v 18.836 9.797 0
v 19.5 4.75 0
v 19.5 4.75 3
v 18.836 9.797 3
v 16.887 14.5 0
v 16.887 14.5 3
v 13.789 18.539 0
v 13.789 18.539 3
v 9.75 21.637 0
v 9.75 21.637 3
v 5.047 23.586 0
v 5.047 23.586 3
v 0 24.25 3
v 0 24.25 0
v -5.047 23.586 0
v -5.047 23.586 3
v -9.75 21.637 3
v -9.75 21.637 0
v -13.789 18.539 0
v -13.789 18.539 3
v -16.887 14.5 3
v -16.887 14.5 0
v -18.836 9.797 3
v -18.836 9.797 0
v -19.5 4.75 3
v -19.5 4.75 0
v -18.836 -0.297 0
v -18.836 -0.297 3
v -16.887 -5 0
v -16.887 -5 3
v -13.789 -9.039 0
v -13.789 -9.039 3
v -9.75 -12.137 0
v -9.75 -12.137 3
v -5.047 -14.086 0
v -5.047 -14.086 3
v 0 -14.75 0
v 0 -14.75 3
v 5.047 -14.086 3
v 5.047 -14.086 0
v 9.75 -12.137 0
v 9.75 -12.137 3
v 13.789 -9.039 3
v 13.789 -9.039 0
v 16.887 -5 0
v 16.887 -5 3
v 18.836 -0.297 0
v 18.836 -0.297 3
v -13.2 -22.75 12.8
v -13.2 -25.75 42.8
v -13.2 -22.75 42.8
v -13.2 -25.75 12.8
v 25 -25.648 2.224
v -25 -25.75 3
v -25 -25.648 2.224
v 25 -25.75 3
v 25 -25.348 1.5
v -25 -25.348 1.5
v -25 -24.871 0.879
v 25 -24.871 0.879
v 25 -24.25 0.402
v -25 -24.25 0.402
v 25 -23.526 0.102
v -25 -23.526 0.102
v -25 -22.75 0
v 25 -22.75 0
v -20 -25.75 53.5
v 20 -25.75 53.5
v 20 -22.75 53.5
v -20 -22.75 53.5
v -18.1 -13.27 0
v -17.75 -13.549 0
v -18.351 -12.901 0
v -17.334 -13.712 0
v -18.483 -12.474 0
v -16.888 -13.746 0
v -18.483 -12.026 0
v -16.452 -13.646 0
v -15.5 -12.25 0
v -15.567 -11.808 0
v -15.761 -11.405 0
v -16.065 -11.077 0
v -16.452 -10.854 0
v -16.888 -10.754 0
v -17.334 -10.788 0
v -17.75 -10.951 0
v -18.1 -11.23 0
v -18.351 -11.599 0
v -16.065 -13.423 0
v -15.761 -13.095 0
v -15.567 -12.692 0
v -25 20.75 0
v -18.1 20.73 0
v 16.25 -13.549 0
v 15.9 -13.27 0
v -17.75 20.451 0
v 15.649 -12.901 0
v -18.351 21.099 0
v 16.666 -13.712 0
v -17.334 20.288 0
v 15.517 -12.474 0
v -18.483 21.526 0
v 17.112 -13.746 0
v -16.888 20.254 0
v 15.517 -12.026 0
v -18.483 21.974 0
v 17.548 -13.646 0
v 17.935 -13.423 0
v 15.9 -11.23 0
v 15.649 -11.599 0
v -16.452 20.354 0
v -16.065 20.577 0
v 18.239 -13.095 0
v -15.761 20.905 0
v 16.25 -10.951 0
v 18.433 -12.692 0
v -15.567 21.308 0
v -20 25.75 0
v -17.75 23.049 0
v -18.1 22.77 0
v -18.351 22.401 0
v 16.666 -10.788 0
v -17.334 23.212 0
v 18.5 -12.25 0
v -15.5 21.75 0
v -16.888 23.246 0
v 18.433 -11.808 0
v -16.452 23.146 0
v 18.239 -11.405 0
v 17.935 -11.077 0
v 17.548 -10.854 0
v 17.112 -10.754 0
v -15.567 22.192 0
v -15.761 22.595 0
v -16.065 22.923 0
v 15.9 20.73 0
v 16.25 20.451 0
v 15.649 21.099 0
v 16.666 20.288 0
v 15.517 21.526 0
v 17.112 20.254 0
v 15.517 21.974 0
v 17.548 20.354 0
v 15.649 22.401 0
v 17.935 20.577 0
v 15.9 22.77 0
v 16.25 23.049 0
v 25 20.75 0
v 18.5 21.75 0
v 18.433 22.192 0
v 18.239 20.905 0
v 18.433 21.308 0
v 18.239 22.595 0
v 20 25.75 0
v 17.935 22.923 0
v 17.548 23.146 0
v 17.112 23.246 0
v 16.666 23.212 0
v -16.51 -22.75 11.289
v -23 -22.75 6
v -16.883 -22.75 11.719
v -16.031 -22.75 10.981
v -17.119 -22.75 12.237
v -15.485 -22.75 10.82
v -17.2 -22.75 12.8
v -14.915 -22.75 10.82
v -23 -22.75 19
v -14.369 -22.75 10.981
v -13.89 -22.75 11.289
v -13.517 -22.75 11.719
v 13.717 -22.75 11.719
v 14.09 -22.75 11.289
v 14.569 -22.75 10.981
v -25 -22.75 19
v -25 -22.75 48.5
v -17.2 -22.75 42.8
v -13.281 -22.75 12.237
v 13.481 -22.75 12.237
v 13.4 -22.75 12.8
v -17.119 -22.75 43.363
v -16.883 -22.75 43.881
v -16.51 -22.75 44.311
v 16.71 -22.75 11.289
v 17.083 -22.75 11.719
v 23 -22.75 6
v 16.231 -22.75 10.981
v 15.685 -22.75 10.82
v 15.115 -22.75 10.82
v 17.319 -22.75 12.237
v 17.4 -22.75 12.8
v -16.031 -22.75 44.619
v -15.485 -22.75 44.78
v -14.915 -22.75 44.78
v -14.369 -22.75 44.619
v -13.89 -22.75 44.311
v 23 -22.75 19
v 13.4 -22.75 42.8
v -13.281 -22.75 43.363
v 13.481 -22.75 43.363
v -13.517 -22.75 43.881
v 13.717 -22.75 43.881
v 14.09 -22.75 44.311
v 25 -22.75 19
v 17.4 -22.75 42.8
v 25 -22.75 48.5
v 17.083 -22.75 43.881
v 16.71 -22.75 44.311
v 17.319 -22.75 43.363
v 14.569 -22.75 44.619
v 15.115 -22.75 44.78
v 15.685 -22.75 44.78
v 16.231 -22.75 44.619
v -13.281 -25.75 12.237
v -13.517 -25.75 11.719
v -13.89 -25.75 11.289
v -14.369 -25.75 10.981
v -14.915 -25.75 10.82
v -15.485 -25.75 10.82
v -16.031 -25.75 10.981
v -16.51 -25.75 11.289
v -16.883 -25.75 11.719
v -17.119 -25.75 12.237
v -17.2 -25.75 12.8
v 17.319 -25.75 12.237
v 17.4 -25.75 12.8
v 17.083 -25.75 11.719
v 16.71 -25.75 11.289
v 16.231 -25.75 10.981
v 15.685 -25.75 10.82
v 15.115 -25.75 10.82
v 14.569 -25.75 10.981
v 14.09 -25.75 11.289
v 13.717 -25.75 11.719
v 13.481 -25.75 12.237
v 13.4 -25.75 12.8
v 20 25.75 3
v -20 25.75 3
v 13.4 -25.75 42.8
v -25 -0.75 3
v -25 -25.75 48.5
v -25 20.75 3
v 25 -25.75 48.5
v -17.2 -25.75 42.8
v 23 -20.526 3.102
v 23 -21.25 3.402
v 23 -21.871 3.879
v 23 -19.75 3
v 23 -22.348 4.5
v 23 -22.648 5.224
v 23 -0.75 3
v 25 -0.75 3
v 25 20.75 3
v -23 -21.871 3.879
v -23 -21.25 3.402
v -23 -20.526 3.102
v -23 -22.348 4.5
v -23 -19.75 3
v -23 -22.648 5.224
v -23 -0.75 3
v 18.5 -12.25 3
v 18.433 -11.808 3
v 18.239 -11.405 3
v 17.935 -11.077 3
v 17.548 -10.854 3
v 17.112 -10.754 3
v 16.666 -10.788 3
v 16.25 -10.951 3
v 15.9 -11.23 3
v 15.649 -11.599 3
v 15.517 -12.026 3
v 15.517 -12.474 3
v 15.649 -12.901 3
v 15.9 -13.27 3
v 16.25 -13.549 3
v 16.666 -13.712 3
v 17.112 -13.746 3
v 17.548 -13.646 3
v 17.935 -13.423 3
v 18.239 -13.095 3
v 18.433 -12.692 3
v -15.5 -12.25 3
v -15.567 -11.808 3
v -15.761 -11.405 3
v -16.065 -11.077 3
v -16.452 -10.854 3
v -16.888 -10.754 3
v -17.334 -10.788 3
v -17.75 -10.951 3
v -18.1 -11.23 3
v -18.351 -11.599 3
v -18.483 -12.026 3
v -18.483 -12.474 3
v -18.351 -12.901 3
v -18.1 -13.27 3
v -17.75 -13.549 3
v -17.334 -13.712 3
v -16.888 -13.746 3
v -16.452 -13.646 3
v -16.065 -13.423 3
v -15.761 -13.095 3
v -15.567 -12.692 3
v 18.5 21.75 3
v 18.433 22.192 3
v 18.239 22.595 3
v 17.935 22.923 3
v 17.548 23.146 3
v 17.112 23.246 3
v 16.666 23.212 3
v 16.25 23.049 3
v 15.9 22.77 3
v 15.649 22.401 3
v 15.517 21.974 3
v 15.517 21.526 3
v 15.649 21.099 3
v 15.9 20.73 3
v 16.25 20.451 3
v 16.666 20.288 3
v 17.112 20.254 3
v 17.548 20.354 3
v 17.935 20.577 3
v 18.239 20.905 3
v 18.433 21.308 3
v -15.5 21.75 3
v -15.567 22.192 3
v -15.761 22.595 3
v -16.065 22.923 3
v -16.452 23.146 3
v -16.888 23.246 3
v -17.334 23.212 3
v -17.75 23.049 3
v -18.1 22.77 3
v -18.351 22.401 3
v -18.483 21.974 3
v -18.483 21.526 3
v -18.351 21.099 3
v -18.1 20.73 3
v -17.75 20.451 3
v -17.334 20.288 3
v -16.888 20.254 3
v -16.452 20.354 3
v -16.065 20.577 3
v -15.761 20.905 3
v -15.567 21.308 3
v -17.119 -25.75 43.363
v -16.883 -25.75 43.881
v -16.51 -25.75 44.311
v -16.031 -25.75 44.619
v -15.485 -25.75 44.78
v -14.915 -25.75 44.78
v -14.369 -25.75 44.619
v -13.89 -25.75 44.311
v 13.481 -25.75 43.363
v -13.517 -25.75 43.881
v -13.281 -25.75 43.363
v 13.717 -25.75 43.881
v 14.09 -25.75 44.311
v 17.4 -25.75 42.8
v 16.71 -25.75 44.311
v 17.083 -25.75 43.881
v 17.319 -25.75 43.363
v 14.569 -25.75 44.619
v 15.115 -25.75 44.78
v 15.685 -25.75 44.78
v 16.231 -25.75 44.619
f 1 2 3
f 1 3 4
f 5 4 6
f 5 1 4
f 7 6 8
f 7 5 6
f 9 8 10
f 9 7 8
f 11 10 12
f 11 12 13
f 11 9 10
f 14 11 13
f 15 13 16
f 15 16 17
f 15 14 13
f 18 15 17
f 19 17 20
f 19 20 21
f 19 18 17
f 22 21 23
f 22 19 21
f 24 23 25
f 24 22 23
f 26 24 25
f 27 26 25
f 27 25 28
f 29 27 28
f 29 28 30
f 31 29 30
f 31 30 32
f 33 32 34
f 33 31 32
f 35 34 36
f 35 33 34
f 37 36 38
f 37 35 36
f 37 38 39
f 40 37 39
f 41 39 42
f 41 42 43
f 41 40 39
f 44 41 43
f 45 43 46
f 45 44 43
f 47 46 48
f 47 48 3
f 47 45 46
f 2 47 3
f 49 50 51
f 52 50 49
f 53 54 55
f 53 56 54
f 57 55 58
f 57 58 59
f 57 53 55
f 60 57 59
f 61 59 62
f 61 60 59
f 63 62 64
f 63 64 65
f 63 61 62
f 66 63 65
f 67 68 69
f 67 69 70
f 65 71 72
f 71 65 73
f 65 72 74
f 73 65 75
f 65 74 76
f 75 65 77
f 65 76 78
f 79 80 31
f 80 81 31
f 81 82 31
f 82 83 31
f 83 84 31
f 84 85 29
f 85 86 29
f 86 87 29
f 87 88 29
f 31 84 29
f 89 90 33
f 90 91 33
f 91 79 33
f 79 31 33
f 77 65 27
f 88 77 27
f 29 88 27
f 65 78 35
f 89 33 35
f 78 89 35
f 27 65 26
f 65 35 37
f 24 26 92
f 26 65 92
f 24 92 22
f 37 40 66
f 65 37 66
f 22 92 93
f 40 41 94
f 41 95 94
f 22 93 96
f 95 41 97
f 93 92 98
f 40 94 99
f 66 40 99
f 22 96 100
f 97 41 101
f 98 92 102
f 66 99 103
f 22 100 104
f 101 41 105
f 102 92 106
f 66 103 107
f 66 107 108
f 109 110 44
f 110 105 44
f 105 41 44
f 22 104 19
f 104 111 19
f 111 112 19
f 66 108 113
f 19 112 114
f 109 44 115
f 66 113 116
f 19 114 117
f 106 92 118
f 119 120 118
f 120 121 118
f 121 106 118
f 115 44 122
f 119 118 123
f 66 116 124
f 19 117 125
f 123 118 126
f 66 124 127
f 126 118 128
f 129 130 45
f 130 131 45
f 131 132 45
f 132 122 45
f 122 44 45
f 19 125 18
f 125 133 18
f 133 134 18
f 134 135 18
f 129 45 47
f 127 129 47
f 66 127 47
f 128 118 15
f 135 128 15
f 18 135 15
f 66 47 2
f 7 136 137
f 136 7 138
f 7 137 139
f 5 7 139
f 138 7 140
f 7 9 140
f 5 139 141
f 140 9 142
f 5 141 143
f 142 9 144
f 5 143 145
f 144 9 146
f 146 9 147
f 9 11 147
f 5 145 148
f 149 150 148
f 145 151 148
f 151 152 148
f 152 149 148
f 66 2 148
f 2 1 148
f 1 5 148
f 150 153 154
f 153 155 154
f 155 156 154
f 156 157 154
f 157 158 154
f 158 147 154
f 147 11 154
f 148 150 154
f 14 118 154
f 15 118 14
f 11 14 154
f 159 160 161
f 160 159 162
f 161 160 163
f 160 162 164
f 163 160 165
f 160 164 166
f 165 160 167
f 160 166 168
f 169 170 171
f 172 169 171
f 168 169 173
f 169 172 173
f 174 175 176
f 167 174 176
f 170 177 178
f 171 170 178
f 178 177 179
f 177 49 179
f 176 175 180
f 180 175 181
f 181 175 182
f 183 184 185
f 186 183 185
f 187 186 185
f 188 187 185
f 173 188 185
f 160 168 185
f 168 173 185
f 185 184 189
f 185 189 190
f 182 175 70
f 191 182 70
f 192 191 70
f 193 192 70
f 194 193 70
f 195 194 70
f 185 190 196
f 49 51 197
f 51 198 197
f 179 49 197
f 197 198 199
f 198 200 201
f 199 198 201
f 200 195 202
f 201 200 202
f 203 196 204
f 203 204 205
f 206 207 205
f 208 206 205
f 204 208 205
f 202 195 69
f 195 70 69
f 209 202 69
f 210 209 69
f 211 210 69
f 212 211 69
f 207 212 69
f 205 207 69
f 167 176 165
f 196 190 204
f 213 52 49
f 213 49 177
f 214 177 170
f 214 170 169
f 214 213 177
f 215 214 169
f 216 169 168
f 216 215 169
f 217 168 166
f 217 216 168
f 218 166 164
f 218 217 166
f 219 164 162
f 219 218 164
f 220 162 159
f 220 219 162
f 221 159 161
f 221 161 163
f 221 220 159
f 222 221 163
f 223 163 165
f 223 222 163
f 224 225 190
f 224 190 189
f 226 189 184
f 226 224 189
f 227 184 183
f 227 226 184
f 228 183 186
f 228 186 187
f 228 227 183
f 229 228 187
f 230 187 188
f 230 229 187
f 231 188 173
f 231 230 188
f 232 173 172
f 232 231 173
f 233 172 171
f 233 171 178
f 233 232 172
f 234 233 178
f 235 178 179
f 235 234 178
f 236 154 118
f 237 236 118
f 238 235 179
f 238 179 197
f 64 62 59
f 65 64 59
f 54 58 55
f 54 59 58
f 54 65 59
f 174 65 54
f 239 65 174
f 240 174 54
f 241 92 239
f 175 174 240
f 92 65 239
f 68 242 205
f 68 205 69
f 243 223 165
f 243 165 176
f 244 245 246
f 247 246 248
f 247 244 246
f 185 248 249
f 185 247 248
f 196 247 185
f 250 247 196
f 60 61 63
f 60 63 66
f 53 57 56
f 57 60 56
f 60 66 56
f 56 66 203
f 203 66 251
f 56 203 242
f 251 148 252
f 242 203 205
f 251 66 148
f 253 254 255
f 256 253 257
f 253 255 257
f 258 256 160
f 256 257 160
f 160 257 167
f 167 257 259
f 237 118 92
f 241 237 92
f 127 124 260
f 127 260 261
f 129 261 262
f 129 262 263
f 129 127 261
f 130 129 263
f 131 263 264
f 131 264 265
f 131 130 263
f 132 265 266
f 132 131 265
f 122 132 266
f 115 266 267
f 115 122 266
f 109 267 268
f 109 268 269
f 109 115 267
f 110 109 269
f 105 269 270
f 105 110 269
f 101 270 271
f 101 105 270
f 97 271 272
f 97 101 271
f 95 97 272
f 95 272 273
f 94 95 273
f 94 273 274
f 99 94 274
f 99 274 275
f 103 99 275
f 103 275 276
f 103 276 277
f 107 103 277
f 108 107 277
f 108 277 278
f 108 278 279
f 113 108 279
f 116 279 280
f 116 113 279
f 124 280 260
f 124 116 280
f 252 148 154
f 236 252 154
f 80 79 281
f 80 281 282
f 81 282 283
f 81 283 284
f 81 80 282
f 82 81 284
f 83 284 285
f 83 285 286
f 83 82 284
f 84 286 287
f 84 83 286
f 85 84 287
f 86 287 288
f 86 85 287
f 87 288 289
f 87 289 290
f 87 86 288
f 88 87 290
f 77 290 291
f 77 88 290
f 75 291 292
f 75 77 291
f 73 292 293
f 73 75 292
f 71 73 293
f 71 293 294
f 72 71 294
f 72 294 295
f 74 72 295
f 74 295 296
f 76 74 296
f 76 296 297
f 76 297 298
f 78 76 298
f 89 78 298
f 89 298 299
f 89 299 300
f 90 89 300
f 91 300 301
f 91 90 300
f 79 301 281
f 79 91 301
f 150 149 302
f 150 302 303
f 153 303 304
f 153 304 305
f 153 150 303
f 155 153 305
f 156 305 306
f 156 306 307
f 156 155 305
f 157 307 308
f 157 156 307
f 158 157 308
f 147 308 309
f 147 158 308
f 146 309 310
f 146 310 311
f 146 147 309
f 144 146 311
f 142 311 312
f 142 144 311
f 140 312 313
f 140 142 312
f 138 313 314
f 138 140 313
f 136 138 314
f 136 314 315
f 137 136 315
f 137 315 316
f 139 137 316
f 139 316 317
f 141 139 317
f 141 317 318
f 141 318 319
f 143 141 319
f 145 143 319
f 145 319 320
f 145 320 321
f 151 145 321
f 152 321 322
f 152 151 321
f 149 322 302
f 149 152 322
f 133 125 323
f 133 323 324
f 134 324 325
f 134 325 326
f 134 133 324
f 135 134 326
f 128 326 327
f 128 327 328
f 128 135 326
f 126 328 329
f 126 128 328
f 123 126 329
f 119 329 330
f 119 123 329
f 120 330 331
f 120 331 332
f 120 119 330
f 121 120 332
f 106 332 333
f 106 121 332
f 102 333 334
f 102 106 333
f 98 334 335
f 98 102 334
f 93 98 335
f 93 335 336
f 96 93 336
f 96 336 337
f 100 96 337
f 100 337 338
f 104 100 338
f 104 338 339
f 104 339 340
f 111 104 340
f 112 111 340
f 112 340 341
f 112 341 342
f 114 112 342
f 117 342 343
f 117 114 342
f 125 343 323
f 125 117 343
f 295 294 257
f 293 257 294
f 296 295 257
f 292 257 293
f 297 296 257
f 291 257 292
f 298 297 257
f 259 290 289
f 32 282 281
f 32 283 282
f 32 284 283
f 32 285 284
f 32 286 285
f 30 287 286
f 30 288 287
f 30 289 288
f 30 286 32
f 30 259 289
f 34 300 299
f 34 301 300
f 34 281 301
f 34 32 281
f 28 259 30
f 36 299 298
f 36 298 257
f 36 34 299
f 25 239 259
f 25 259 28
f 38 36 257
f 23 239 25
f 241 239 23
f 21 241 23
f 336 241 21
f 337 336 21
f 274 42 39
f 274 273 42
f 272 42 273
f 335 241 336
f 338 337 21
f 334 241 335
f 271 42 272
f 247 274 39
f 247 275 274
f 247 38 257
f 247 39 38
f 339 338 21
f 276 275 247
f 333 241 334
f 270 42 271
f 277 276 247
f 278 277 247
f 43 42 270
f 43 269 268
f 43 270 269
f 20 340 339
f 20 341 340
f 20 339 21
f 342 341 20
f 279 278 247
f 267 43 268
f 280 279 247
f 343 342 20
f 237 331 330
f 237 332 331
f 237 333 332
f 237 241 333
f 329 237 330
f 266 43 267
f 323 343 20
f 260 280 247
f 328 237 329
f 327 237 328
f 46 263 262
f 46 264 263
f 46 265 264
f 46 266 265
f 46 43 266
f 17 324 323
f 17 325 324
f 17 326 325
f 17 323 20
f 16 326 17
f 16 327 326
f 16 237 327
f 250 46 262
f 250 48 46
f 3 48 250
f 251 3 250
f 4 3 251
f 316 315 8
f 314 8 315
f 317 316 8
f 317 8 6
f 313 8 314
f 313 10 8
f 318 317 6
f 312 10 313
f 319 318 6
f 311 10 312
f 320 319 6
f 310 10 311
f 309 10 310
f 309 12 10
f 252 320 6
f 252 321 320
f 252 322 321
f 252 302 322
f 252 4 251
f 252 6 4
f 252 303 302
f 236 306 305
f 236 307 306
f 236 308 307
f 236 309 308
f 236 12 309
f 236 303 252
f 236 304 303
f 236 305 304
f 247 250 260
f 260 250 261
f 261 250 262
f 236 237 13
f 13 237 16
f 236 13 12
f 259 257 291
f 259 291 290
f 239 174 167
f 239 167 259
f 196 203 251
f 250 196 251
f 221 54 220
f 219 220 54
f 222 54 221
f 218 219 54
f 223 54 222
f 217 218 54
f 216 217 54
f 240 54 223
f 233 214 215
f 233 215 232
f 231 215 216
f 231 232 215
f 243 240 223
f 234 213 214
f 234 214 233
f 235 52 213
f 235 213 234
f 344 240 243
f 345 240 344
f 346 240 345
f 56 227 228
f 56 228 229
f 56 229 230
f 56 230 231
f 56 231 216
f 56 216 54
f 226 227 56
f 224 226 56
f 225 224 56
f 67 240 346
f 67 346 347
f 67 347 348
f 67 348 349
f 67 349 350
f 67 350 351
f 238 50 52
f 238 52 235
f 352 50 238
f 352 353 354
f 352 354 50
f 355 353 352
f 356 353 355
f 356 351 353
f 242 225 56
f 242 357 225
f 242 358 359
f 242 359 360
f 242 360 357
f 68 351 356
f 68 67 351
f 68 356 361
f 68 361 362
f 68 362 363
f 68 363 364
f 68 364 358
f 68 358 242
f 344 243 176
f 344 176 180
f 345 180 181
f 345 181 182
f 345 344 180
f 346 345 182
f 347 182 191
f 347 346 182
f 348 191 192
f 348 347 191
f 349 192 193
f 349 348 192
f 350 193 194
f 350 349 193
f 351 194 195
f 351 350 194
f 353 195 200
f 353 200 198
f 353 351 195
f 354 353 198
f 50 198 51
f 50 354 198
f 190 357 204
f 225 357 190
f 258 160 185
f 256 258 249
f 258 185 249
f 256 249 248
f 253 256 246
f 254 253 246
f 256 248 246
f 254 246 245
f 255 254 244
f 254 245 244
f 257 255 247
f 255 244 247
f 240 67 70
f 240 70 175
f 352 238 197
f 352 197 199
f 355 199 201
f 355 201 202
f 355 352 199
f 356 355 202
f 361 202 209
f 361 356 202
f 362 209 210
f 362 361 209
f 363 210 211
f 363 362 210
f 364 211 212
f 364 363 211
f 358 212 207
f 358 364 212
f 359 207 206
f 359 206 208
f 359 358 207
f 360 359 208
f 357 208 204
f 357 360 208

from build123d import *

# Parameters (mm, degrees)
SKETCH_1_R      = 1.5
SKETCH_1_R_2    = 19.5
EXTRUDE_1_DEPTH = 3
EXTRUDE_3_DEPTH = 3
EXTRUDE_4_DEPTH = 2
FILLET_2_R      = 3


with BuildPart() as part:
    # 草图1 → 凸台-拉伸1 (new body)
    with BuildSketch(Plane.XY):
        Polygon((20, 25.75), (-20, 25.75), (-25, 20.75), (-25, -25.75), (25, -25.75), (25, 20.75), align=None)
        with Locations((-17, -12.25)):
            Circle(SKETCH_1_R, mode=Mode.SUBTRACT)
        with Locations((17, -12.25)):
            Circle(SKETCH_1_R, mode=Mode.SUBTRACT)
        with Locations((-17, 21.75)):
            Circle(SKETCH_1_R, mode=Mode.SUBTRACT)
        with Locations((0, 4.75)):
            Circle(SKETCH_1_R_2, mode=Mode.SUBTRACT)
        with Locations((17, 21.75)):
            Circle(SKETCH_1_R, mode=Mode.SUBTRACT)
    extrude(amount=EXTRUDE_1_DEPTH)

    # 草图2 → 凸台-拉伸3 (add)
    with BuildSketch(Plane.XZ.offset(25.75)):
        Polygon((-25, 48.5), (-25, 0), (25, 0), (25, 48.5), (20, 53.5), (-20, 53.5), align=None)
        with BuildLine():
            ThreePointArc((-13.2, 12.8), (-15.2, 10.8), (-17.2, 12.8))
            Line((-17.2, 12.8), (-17.2, 42.8))
            ThreePointArc((-17.2, 42.8), (-15.2, 44.8), (-13.2, 42.8))
            Line((-13.2, 42.8), (-13.2, 12.8))
        make_face(mode=Mode.SUBTRACT)
        with BuildLine():
            ThreePointArc((17.4, 12.8), (15.4, 10.8), (13.4, 12.8))
            Line((13.4, 12.8), (13.4, 42.8))
            ThreePointArc((13.4, 42.8), (15.4, 44.8), (17.4, 42.8))
            Line((17.4, 42.8), (17.4, 12.8))
        make_face(mode=Mode.SUBTRACT)
    extrude(amount=-EXTRUDE_3_DEPTH)

    # 草图3 → 凸台-拉伸4 (add)
    with BuildSketch(Plane(origin=(25, 0, 0), x_dir=(0, 0, -1), z_dir=(1, 0, 0))):
        Polygon((-3, -0.75), (-3, -22.75), (-19, -22.75), align=None)
    extrude_4 = extrude(amount=-EXTRUDE_4_DEPTH)

    # 镜向1: 凸台-拉伸4 across plane
    add(extrude_4.mirror(Plane(origin=(0, 0, 0), x_dir=(0, 0, 1), z_dir=(1, 0, 0))))

    # 圆角2
    fillet_2_edges = [part.edges().sort_by_distance(p)[0] for p in [
        (0, -25.75, 0),
        (0, -22.75, 3),
    ]]
    fillet(fillet_2_edges, radius=FILLET_2_R)


solid = part.part
